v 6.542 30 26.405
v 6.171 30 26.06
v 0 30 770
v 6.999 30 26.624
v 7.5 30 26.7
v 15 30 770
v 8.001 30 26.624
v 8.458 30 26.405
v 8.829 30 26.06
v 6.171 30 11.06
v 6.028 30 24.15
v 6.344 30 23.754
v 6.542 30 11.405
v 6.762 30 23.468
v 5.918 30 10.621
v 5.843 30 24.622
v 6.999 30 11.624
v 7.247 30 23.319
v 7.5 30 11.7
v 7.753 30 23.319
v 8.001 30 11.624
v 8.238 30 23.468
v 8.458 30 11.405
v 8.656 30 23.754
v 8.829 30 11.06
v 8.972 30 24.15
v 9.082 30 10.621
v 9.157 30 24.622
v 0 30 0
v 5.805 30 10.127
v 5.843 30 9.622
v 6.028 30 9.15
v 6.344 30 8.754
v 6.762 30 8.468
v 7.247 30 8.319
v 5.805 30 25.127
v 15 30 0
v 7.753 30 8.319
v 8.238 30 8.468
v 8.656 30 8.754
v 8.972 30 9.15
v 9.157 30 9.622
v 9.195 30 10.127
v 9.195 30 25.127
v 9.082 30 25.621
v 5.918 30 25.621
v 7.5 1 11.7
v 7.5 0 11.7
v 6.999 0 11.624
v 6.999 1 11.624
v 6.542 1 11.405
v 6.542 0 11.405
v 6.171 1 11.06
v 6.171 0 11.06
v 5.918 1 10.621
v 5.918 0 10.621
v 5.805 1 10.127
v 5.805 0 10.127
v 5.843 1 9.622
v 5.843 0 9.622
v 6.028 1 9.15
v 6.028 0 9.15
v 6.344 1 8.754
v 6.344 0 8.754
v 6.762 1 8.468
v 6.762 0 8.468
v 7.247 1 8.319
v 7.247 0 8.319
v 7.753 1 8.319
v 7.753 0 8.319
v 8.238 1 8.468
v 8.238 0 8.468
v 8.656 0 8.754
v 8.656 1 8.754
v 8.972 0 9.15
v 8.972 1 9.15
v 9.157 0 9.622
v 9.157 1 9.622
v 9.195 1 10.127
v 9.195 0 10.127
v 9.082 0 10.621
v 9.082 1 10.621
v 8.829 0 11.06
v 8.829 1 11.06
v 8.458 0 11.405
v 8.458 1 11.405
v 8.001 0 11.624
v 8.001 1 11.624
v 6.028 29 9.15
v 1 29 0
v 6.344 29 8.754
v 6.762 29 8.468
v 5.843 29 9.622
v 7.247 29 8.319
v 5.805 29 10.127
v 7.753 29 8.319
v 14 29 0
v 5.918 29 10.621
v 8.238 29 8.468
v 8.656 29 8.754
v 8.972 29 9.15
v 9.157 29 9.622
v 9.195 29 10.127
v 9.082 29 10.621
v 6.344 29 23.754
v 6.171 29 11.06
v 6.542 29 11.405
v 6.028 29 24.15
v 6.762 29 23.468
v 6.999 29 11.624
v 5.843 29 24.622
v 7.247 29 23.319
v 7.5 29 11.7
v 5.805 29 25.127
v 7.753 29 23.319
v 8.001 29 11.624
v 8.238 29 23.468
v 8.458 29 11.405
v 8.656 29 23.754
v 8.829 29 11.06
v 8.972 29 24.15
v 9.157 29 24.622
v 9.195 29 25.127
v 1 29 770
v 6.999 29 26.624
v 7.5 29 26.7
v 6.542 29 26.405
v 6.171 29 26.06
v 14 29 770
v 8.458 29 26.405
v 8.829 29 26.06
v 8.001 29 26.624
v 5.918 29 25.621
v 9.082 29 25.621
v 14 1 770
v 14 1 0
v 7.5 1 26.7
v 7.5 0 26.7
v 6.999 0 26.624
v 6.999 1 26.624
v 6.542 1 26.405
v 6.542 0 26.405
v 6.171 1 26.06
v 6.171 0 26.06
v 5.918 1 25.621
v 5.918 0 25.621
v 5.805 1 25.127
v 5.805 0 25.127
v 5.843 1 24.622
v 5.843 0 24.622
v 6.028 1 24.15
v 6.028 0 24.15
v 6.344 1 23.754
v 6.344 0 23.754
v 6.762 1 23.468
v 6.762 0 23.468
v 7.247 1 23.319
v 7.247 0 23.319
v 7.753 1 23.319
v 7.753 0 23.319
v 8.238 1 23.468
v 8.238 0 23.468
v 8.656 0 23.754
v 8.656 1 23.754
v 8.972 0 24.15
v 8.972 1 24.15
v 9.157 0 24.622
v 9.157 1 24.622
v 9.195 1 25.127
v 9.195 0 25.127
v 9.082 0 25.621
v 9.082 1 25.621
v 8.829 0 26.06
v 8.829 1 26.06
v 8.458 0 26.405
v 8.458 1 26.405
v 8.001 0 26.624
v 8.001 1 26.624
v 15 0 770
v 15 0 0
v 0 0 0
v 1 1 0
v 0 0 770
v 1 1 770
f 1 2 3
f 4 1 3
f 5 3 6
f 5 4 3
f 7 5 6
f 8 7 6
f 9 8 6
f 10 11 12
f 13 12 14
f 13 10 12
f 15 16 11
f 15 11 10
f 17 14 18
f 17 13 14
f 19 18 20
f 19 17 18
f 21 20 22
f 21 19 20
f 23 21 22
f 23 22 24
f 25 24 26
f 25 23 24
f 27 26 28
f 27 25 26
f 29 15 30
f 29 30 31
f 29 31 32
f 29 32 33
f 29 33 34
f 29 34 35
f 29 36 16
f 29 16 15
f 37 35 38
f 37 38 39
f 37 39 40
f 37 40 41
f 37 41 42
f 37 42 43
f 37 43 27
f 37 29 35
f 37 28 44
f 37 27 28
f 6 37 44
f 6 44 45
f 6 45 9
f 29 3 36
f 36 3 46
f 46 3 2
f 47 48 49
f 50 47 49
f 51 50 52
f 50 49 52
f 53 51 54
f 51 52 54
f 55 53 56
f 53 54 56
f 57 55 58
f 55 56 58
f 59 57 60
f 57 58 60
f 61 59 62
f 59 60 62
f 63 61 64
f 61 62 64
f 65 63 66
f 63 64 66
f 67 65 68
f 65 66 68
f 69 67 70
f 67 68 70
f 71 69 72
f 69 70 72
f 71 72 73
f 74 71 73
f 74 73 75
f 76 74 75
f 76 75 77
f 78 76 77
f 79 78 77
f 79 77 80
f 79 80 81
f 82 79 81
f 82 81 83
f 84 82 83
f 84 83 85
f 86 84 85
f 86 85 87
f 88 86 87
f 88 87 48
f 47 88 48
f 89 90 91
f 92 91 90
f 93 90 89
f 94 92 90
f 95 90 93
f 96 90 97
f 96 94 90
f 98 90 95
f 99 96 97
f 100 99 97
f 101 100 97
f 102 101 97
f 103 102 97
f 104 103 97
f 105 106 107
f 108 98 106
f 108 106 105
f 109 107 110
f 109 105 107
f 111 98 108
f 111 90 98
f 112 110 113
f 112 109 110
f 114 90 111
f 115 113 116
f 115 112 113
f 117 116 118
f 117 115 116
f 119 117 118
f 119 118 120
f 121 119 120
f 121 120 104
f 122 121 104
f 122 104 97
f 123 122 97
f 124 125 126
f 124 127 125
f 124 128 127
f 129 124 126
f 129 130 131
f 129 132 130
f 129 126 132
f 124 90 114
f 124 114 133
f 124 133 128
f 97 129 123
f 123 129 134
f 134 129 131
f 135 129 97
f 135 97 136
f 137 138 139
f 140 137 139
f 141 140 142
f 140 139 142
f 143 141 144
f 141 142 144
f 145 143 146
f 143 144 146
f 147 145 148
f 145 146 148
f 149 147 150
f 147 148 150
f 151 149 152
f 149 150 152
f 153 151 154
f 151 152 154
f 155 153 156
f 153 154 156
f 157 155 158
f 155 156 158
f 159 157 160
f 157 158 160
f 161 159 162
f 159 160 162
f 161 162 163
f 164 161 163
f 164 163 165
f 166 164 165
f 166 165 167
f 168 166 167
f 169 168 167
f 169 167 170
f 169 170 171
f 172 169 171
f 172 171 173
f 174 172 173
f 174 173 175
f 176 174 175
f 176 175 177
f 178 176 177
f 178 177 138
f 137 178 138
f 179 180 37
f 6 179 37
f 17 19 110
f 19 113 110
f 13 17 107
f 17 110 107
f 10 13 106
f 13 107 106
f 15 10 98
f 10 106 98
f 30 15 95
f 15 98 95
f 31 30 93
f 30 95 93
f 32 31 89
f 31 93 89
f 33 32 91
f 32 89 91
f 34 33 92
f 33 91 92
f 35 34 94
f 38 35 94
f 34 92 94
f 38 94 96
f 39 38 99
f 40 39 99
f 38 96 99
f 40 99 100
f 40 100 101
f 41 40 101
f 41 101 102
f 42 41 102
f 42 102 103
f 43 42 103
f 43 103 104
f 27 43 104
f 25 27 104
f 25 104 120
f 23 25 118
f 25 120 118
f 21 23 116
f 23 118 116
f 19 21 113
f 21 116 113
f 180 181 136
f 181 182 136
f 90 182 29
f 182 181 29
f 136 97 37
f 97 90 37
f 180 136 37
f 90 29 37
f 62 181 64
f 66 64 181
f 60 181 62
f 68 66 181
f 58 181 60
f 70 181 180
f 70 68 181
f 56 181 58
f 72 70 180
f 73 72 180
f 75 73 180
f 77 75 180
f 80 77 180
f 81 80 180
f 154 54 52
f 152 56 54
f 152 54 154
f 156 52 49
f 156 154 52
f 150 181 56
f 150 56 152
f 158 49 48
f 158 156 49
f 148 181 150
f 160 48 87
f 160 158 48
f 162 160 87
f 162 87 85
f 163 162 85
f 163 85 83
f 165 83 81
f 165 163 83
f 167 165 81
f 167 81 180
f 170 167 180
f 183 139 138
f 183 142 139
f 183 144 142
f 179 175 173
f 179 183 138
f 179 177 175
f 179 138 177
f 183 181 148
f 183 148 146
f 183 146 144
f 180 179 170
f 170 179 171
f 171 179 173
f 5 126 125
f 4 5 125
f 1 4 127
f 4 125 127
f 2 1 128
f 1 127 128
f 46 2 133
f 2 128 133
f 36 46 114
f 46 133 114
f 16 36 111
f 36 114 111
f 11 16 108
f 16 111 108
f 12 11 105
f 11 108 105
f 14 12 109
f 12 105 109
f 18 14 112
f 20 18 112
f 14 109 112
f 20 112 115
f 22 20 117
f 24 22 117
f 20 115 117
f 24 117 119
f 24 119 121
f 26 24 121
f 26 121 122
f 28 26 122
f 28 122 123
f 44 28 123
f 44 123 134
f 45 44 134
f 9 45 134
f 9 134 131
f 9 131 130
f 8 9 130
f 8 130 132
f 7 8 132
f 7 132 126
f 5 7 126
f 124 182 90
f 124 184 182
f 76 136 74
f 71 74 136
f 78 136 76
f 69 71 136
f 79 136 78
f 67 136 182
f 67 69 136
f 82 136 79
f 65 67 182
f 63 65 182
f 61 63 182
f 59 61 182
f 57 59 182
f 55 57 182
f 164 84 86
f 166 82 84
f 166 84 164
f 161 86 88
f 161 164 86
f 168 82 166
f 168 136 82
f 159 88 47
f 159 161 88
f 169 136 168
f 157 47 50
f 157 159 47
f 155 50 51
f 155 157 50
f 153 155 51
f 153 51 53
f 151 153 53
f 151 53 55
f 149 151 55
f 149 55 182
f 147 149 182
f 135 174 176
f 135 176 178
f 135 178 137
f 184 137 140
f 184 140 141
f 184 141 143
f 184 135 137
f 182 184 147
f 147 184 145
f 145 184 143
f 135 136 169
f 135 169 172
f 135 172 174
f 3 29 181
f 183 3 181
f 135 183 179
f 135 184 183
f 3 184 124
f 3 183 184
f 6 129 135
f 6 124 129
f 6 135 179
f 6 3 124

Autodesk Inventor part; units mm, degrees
ref_plane "YZ Plane" through (0, 0, 0) normal (1, 0, 0) x (0, 1, 0)
ref_plane "XZ Plane" through (0, 0, 0) normal (0, 1, 0) x (-1, 0, 0)
ref_plane "XY Plane" through (0, 0, 0) normal (0, 0, 1) x (1, 0, 0)
sketch "スケッチ1" plane through (0, 0, 0) normal (0, 0, 1) x (1, 0, 0)
  point P0 (0, 0)
sketch "スケッチ2" plane through (0, 0, 0) normal (0, 0, 1) x (1, 0, 0)
  line L0 (0, 0) -> (15, 0)
  line L1 (15, 0) -> (15, 30)
  line L2 (15, 30) -> (0, 30)
  line L3 (0, 30) -> (0, 0)
  dimension "d0" = 15
  dimension "d1" = 30
extrude "押し出し1" add sketch "スケッチ2" along normal blind 770
sketch "スケッチ3" plane through (0, 0, 770) normal (0, 0, 1) x (1, 0, 0)
  line L0 (1, 29) -> (14, 29)
  line L1 (14, 29) -> (14, 1)
  line L2 (14, 1) -> (1, 1)
  line L3 (1, 1) -> (1, 29)
  line L4 (0, 30) -> (0, 0) projected
  line L5 (15, 30) -> (0, 30) projected
  dimension "d4" = 13
  dimension "d5" = 28
  dimension "d6" = 1
  dimension "d7" = 1
extrude "押し出し2" cut sketch "スケッチ3" against normal blind 770
sketch "スケッチ4" plane through (0, 30, 770) normal (0, 1, 0) x (1, 0, 0)
  circle A0 centre (7.5, 760) radius 1.6
  line L0 (15, 770) -> (0, 770) projected
  line L1 (15, 770) -> (15, 0) projected
  circle A1 centre (7.5, 750) radius 1.6
  dimension "d10" = 3.2
  dimension "d11" = 10
  dimension "d12" = 7.5
  dimension "d13" = 3.2
  dimension "d14" = 7.5
  dimension "d15" = 10
sketch "スケッチ5" plane through (0, 30, 770) normal (0, 1, 0) x (1, 0, 0)
  point P0 (0, 770)
hole "穴1" at (7.5, 30, 20) at (7.5, 30, 10) direction (0, -1, 0) diameter 3.4 depth 30
sketch "スケッチ6" plane through (0, 30, 770) normal (0, 1, 0) x (1, 0, 0)
  circle A0 centre (7.5, 750) radius 1.7 projected
  circle A1 centre (7.5, 750) radius 1.7
  point P0 (0, 770)
  dimension "d23" = 3.4
extrude "押し出し3" add sketch "スケッチ6" against normal blind 1
sketch "スケッチ7" plane through (15, 0, 0) normal (0, -1, 0) x (1, 0, 0)
  circle A0 centre (-7.5, 20) radius 1.7 projected
  circle A1 centre (-7.5, 20) radius 1.7
  point P0 (-15, 0)
  dimension "d26" = 3.4
extrude "押し出し4" add sketch "スケッチ7" against normal blind 1
sketch "スケッチ8" plane through (0, 30, 770) normal (0, 1, 0) x (1, 0, 0)
  circle A0 centre (7.5, 745) radius 1.7
  circle A1 centre (7.5, 760) radius 1.7 projected
  line L0 (15, 770) -> (15, 0) projected
  point P0 (0, 770)
  dimension "d29" = 3.4
  dimension "d30" = 15
  dimension "d31" = 7.5
hole "穴2" at (7.5, 30, 25) direction (0, -1, 0) diameter 3.4 depth 30
equation "\"BendRadius\" = Thickness"
equation "\"BendReliefWidth\" = Thickness"
equation "\"BendReliefDepth\" = 0.5 * Thickness"
equation "\"CornerReliefSize\" = 4 * Thickness"
equation "\"MinimumRemnant\" = 2 * Thickness"
equation "\"TransitionRadius\" = BendRadius"
equation "\"JacobiRadiusSize\" = BendRadius"
equation "\"GapSize\" = Thickness"
equation "\"Thickness\" = 3.048"
properties part number "オムニ_角柱2_N"
